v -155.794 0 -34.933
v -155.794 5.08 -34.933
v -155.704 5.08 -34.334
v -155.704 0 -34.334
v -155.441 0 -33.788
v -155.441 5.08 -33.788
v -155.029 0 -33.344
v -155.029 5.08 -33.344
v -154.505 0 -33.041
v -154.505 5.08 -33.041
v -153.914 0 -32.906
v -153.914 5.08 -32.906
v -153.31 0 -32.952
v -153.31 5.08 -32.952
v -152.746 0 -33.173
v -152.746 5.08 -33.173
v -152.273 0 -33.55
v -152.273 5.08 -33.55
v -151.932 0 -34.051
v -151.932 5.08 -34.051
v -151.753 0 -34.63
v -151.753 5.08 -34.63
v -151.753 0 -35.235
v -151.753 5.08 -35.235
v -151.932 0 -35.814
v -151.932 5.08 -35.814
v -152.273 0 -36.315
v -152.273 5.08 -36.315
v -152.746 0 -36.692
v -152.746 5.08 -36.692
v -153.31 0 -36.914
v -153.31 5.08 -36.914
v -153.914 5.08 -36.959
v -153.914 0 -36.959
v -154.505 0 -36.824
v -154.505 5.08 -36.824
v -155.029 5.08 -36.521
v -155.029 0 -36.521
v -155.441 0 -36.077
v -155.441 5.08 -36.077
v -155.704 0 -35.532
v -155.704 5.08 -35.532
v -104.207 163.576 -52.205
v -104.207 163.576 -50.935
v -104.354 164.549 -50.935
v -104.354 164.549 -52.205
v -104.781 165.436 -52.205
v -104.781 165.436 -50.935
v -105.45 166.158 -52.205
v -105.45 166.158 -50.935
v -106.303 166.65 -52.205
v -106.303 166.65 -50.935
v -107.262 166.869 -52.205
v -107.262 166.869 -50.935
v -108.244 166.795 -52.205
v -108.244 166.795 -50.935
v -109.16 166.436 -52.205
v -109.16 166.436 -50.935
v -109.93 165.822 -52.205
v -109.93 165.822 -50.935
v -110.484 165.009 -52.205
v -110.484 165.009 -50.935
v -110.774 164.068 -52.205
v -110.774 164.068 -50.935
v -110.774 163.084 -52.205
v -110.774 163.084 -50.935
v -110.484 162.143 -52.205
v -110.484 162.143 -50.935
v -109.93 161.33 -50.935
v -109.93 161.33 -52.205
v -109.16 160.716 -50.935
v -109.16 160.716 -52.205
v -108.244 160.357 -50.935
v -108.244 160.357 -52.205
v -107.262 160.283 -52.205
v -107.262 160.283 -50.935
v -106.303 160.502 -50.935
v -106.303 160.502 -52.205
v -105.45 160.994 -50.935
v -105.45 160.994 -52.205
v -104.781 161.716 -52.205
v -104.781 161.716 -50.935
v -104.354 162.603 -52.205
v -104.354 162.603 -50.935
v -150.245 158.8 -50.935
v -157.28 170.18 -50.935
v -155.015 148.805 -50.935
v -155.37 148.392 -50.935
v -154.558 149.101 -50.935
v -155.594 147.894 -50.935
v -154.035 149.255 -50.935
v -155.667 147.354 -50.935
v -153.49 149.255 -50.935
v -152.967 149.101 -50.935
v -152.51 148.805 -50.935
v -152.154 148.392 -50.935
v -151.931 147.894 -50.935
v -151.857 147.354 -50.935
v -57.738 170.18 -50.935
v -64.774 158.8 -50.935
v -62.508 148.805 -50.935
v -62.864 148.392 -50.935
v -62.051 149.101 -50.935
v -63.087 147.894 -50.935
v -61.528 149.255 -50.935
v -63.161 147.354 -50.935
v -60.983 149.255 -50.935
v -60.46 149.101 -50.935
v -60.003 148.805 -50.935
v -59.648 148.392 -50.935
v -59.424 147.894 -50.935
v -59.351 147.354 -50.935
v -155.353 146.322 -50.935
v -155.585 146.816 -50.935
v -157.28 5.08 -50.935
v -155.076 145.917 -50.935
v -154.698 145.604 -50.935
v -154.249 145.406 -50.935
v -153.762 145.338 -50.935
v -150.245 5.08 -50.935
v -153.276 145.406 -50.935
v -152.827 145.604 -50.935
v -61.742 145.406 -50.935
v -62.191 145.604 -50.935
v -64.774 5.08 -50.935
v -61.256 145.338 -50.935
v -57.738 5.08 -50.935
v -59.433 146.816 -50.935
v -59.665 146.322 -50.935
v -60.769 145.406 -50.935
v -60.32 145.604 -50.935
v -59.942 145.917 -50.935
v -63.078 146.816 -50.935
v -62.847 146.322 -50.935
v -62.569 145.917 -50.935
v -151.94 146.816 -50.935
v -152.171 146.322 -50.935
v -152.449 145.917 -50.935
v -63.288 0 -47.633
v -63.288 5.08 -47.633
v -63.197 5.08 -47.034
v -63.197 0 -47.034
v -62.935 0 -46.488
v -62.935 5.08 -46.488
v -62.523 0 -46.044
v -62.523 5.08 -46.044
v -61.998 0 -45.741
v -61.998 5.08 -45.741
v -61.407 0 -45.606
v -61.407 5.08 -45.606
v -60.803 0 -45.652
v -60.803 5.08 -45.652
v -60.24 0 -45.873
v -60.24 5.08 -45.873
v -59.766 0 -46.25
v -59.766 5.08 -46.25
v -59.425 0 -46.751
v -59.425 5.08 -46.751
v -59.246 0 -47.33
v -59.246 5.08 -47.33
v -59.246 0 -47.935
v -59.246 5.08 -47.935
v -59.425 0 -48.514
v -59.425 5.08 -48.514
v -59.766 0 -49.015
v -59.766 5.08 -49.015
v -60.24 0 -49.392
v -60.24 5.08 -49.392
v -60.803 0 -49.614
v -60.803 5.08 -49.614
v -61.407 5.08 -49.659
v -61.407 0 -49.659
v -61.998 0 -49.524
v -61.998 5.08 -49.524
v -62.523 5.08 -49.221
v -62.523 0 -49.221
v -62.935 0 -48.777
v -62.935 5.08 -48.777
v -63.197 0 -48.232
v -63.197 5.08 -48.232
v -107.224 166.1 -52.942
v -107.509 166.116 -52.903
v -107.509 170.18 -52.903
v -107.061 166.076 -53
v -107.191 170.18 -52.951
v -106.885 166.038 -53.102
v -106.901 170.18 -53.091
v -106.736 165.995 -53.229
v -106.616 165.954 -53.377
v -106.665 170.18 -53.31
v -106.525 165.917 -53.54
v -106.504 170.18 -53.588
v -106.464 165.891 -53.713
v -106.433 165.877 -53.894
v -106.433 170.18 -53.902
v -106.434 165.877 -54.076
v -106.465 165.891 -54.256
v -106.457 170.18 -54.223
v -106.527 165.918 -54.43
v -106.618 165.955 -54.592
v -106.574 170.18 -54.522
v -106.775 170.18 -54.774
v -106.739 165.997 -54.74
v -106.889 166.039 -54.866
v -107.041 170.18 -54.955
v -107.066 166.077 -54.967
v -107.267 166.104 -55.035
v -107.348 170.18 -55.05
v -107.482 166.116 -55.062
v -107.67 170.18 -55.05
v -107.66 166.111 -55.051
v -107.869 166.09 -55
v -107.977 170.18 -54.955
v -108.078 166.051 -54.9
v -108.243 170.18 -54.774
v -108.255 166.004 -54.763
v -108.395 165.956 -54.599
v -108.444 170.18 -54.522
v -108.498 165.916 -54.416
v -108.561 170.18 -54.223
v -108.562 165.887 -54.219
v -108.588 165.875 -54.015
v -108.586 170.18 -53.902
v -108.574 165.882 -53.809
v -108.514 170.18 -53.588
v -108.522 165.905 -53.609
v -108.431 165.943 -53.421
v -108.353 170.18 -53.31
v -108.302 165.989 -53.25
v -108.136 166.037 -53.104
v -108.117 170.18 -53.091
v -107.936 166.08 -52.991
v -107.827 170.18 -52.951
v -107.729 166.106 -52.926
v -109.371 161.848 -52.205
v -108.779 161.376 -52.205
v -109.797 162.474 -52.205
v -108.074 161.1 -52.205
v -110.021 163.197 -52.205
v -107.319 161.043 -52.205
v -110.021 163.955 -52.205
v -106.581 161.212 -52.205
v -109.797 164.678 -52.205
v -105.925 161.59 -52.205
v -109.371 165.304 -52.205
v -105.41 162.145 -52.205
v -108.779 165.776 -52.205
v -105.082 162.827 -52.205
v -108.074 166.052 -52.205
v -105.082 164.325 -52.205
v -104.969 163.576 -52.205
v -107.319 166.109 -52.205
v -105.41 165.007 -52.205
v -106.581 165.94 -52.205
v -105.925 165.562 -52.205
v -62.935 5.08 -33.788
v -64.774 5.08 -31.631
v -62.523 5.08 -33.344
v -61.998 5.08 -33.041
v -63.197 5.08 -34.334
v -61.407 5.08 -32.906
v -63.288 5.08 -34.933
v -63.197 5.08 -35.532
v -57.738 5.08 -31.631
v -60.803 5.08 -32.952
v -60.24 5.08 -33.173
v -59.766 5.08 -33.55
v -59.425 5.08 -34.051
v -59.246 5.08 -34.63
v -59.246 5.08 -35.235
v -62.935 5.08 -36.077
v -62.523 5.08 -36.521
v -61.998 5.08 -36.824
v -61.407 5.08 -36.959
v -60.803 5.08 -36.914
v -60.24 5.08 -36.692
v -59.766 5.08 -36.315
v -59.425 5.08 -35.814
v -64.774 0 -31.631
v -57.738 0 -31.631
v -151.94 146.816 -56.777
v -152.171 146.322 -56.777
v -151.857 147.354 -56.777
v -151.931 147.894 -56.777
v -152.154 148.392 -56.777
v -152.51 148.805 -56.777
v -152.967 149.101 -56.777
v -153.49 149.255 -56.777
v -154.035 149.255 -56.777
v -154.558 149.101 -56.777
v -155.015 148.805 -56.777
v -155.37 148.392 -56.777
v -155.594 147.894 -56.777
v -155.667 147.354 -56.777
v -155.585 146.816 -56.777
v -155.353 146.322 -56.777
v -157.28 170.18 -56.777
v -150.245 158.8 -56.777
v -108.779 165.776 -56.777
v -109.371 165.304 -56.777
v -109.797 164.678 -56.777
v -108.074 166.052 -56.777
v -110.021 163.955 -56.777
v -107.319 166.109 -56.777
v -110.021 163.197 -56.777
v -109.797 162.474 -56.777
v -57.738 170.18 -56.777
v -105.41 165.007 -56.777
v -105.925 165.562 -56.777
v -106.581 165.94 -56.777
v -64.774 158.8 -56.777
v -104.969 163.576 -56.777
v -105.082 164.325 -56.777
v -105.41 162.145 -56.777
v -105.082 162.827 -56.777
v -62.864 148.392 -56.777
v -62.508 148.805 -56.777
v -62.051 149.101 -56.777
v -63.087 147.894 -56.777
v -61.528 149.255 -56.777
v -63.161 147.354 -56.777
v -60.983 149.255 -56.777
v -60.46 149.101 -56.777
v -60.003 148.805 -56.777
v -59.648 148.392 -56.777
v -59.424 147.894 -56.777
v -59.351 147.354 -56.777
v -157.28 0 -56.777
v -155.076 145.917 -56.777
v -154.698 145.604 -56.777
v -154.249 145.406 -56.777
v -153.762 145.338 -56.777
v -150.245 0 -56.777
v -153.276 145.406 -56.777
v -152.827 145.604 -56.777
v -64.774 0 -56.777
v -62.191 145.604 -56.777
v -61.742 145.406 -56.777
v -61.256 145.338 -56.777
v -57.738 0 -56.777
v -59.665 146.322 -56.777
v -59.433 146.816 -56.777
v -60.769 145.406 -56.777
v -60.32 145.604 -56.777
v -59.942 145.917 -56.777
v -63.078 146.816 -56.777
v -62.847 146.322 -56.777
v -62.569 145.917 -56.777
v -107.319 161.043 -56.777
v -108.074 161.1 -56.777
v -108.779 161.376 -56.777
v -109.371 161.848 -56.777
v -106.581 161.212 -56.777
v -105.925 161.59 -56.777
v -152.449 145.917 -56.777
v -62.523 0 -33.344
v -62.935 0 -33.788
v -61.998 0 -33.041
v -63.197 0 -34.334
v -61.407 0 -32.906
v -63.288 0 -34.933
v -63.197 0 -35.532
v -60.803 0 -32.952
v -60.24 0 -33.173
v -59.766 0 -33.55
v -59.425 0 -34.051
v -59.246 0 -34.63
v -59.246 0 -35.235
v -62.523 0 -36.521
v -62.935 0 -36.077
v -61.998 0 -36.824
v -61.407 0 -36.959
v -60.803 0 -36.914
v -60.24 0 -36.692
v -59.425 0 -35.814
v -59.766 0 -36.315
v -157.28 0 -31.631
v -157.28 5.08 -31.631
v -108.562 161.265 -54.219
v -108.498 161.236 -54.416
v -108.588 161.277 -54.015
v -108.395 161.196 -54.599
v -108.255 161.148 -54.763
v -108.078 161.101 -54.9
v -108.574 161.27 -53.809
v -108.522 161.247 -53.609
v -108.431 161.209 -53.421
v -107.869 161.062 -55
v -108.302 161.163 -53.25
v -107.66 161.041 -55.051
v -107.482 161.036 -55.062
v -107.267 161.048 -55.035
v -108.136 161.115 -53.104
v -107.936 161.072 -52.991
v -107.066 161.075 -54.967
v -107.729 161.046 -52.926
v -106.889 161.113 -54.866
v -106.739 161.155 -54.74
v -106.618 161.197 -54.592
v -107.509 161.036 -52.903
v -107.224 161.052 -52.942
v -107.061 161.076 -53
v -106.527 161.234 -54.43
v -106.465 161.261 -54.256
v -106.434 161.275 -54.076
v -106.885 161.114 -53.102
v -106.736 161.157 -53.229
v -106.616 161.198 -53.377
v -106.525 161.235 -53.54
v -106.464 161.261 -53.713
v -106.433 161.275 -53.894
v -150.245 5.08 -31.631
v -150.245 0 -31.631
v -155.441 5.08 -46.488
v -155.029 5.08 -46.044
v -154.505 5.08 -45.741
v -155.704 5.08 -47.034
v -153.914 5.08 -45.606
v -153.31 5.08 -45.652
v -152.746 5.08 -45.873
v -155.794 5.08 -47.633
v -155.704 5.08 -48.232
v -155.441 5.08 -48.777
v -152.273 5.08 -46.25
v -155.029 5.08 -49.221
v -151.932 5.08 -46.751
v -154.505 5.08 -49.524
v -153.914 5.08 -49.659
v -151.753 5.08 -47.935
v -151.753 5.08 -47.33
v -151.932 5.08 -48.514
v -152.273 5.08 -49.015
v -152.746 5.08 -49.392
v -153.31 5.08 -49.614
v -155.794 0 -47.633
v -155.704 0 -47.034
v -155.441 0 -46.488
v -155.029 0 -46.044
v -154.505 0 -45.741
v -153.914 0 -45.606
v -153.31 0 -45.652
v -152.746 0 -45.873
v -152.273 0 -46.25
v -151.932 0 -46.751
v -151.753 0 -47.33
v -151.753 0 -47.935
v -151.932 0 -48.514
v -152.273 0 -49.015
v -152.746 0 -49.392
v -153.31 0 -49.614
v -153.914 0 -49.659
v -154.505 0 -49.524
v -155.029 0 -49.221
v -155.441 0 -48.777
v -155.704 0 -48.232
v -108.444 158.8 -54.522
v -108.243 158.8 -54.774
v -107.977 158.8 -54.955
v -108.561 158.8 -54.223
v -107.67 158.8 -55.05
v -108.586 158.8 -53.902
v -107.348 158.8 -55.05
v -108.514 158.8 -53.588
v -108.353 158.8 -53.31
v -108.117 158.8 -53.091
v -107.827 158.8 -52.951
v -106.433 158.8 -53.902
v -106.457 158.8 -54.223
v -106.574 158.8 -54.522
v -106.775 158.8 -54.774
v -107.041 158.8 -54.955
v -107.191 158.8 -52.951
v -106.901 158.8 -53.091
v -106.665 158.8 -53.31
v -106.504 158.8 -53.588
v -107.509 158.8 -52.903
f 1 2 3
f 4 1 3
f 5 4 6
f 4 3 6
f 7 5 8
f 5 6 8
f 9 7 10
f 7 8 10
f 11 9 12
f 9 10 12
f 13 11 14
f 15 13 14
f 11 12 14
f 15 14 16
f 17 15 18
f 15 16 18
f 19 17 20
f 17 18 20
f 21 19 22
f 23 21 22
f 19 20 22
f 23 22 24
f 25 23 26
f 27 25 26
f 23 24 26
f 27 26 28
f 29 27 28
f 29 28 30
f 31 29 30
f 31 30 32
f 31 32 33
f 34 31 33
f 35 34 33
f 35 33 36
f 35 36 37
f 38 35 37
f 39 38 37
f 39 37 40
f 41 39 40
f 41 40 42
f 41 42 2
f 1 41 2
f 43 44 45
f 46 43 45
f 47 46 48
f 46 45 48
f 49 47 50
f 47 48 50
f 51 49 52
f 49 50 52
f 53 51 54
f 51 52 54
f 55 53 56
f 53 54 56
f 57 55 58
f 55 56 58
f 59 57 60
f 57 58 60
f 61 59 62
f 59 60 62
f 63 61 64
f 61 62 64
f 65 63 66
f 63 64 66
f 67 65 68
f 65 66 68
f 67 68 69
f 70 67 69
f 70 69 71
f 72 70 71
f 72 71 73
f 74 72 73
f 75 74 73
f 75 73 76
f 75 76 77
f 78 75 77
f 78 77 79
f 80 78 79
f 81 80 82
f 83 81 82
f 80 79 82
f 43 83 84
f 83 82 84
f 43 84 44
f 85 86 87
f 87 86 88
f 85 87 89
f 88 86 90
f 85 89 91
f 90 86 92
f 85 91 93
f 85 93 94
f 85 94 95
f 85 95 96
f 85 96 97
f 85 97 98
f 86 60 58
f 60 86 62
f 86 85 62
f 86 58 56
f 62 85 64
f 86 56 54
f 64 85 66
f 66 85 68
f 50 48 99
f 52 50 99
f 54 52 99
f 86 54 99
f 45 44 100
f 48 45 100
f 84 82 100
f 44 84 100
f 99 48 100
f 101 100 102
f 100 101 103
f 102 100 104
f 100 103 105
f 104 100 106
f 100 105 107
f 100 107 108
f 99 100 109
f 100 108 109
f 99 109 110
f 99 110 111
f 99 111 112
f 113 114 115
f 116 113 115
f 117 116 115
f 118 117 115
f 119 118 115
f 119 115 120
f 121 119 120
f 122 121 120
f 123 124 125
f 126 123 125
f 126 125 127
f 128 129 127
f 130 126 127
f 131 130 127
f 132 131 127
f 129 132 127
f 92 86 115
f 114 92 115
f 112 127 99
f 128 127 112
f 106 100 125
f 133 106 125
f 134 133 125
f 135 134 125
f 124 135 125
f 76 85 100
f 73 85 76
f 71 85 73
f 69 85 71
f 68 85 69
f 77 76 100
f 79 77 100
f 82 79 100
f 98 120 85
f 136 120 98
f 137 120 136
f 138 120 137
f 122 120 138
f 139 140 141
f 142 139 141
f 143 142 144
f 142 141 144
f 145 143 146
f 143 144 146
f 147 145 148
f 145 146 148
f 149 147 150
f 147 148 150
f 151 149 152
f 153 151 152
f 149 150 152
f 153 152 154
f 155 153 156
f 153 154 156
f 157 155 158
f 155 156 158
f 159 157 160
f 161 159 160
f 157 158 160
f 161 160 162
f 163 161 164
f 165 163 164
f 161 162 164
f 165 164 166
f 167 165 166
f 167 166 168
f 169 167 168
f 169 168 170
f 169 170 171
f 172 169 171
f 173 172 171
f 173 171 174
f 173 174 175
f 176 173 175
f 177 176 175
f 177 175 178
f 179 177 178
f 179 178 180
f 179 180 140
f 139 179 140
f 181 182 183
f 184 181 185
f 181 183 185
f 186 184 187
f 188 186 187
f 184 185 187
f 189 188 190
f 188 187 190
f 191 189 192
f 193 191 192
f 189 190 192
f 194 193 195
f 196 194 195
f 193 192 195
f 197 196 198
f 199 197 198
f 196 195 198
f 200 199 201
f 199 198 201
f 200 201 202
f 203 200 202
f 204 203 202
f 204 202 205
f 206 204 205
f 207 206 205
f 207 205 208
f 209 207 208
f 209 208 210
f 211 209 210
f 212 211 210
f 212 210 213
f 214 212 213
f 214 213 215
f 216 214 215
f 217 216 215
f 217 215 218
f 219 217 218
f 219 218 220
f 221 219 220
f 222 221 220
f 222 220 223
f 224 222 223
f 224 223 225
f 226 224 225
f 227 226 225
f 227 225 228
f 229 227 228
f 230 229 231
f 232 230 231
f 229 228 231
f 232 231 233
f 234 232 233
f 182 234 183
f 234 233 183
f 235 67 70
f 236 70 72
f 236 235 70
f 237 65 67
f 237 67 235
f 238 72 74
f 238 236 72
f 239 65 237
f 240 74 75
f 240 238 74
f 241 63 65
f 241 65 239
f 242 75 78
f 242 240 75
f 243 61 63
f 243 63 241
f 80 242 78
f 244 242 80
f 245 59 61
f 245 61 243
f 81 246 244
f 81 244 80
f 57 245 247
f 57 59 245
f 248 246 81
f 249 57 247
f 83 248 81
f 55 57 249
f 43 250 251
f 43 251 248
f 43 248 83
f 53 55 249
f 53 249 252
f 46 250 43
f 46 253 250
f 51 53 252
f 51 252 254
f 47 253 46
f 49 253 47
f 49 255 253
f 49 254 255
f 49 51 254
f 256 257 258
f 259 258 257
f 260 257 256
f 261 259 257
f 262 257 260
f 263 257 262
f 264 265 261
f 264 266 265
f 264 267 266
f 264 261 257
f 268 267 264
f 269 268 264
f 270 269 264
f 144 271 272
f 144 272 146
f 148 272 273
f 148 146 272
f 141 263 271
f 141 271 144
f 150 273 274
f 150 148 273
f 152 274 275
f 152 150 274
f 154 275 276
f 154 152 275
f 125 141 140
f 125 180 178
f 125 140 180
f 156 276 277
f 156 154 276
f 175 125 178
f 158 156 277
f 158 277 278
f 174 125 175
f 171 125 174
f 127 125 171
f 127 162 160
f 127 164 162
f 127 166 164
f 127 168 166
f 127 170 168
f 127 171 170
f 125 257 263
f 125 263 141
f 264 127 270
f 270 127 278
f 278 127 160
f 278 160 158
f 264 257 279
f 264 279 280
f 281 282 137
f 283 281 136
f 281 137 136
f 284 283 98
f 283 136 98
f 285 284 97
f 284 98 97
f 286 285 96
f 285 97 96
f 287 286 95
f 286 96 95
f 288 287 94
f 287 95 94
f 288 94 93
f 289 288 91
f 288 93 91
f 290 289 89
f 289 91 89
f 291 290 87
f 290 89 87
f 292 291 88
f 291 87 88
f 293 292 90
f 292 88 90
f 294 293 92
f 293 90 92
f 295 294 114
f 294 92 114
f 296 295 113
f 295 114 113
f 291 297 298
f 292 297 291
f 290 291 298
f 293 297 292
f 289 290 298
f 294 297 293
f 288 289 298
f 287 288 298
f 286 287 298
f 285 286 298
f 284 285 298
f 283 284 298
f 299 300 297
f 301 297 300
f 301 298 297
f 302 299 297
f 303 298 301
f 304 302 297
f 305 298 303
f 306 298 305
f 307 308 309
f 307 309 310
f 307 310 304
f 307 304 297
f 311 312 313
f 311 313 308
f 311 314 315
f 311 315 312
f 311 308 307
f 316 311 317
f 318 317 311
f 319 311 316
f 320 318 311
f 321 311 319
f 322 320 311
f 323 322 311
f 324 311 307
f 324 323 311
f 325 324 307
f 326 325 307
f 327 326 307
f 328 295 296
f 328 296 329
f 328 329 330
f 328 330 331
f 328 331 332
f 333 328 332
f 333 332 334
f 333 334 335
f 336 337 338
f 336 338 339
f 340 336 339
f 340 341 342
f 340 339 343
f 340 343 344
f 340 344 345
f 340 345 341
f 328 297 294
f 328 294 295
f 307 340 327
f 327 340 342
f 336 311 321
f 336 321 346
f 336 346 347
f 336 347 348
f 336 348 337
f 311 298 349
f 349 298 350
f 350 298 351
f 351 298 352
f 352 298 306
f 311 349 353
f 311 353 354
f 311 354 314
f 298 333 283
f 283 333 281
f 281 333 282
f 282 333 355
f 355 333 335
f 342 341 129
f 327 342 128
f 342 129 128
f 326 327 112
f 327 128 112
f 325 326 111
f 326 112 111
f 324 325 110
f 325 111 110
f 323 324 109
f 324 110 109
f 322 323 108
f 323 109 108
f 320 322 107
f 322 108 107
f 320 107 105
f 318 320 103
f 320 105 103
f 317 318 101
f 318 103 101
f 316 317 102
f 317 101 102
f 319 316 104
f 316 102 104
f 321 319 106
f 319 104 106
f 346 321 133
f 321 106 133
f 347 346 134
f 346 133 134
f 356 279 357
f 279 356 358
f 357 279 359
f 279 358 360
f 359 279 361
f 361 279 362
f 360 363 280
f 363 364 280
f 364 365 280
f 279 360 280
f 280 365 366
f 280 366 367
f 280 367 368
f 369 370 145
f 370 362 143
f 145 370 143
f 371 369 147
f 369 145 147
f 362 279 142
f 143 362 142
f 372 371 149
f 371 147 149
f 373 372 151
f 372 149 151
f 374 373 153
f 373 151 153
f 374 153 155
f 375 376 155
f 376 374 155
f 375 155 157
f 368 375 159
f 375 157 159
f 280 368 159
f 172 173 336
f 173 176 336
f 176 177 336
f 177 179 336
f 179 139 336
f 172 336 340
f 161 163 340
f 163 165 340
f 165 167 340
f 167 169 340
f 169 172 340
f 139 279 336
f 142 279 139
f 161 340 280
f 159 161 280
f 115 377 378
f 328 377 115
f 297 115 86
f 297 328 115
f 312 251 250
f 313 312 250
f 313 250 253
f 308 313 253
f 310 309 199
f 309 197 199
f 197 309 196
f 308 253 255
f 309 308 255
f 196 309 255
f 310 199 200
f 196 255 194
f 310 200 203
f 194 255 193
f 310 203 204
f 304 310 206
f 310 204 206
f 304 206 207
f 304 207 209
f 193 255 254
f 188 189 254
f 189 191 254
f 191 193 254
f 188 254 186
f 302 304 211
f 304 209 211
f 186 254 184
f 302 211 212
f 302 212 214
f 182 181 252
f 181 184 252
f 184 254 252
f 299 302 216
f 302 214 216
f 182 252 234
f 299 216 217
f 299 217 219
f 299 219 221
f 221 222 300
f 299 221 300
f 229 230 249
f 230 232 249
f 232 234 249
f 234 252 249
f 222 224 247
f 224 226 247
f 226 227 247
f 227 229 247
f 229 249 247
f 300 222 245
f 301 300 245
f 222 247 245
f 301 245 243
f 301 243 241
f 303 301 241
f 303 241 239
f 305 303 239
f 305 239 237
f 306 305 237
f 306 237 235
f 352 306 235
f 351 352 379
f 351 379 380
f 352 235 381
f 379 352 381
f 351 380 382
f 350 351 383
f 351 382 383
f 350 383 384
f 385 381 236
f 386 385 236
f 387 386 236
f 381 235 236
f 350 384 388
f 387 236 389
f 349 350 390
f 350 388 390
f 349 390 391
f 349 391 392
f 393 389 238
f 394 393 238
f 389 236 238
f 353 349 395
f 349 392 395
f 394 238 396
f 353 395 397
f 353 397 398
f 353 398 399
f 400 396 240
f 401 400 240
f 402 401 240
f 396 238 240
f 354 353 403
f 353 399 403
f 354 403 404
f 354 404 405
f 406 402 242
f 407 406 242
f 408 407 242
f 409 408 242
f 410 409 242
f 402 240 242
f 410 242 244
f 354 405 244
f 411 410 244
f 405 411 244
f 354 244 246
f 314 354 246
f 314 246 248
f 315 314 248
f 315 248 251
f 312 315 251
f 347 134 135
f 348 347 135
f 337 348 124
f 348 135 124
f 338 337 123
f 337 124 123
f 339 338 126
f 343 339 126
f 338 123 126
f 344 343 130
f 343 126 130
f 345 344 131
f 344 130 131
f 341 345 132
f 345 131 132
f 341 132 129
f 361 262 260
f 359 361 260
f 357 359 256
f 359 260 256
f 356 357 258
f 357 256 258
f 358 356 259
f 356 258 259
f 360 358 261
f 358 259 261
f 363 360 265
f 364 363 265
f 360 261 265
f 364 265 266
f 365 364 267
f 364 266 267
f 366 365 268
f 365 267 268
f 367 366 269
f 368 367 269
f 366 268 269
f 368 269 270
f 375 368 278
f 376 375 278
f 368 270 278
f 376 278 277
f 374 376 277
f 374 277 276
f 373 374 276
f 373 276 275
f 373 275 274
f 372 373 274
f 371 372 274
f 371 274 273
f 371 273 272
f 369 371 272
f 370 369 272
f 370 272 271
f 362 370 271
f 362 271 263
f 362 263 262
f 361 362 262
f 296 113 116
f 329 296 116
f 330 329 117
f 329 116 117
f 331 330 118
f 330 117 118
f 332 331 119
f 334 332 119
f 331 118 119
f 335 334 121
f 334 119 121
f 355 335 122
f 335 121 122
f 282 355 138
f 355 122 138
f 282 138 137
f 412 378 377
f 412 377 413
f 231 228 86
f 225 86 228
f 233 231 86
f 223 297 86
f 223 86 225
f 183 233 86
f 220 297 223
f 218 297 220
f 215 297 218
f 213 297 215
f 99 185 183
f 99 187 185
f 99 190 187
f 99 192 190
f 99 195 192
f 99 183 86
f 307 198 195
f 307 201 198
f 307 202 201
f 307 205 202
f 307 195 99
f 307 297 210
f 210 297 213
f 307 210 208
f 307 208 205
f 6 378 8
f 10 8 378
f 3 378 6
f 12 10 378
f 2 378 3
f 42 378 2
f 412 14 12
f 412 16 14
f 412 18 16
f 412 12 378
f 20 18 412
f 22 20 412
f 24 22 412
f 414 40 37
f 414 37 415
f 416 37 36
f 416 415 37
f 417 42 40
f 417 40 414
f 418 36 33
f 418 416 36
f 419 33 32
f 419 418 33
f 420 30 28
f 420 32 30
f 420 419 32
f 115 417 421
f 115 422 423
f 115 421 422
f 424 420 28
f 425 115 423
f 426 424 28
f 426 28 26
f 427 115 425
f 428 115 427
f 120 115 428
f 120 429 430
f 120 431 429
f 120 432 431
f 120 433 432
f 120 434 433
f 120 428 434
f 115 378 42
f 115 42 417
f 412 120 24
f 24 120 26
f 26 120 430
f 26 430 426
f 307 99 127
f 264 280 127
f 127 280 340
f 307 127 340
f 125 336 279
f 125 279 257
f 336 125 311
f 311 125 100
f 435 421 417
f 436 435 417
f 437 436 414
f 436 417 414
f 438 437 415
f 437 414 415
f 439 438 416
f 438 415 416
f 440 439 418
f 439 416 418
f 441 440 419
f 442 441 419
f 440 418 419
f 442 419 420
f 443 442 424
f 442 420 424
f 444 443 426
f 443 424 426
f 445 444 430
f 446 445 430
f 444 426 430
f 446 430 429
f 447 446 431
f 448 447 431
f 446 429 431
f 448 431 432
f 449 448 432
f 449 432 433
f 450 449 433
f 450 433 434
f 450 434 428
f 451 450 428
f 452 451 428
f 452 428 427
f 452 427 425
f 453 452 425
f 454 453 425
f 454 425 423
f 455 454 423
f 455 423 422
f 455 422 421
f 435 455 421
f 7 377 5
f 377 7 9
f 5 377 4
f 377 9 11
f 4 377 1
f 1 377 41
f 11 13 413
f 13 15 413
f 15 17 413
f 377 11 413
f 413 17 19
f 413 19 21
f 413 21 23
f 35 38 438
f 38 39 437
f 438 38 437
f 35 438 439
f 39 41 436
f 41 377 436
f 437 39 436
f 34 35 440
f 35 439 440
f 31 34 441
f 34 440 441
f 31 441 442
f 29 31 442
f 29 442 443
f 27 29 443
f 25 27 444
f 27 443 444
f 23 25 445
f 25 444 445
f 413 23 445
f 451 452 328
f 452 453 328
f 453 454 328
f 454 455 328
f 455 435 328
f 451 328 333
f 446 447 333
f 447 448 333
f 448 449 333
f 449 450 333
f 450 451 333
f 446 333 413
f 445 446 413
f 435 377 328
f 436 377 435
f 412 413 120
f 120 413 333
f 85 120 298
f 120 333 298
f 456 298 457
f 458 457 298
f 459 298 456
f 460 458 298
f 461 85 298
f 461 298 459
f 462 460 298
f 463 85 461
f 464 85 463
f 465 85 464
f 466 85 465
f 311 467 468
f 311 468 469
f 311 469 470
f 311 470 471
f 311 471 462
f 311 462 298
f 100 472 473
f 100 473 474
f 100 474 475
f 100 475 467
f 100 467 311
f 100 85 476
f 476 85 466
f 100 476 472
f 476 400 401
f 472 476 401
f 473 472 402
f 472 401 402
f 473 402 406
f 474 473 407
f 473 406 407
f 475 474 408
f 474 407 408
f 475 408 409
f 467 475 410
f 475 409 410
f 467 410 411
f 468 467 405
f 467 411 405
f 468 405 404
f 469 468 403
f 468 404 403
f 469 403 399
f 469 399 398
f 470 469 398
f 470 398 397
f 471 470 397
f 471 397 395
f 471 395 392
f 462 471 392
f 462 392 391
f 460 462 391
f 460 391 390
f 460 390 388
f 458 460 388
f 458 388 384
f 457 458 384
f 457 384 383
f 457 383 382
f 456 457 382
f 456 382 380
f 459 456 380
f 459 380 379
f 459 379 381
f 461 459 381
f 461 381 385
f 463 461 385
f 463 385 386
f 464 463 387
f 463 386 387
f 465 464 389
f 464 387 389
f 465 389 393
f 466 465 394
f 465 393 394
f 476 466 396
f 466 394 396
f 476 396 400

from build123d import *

# Parameters (mm, degrees)
SKETCH1_W           = 99.5426
SKETCH1_H           = 5.842
BOSS_EXTRUDE1_DEPTH = 170.18
SKETCH2_W           = 85.471
SKETCH2_H           = 158.8
CUT_EXTRUDE1_DEPTH  = 232.802638094
SKETCH3_W           = 7.0358
SKETCH3_H           = 5.08
BOSS_EXTRUDE2_DEPTH = 19.304
SKETCH4_R           = 2.032
CUT_EXTRUDE2_DEPTH  = 235.986581553
SKETCH5_R           = 2.54
CUT_EXTRUDE3_DEPTH  = 233.531671991
SKETCH7_R           = 3.302
CUT_EXTRUDE4_DEPTH  = 1.27
SKETCH10_R          = 1.0795
CUT_EXTRUDE7_DEPTH  = 239.583142552
SKETCH11_R          = 1.778
CUT_EXTRUDE8_DEPTH  = 233.531672065
SKETCH9_R           = 1.905
CUT_EXTRUDE6_DEPTH  = 233.531672065


with BuildPart() as part:
    # Sketch1 → Boss-Extrude1 (new body)
    with BuildSketch(Plane(origin=(0, 0, 0), x_dir=(1, 0, 0), z_dir=(0, 1, 0))):
        with Locations((-107.509028278, 53.855595943)):
            Rectangle(SKETCH1_W, SKETCH1_H)
    extrude(amount=BOSS_EXTRUDE1_DEPTH)

    # Sketch2 → Cut-Extrude1 (cut, through all)
    with BuildSketch(Plane.XY.offset(-50.934595943)):
        with Locations((-107.509028278, 79.4)):
            Rectangle(SKETCH2_W, SKETCH2_H)
    extrude(amount=-CUT_EXTRUDE1_DEPTH, mode=Mode.SUBTRACT)

    # Sketch3 → Boss-Extrude2 (add)
    with BuildSketch(Plane.XY.offset(-50.934595943)):
        with Locations((-153.762428278, 2.54)):
            Rectangle(SKETCH3_W, SKETCH3_H)
        with Locations((-61.255628278, 2.54)):
            Rectangle(SKETCH3_W, SKETCH3_H)
    extrude(amount=BOSS_EXTRUDE2_DEPTH)

    # Sketch4 → Cut-Extrude2 (cut, through all)
    with BuildSketch(Plane(origin=(0, 5.08, 0), x_dir=(1, 0, 0), z_dir=(0, 1, 0))):
        with Locations(Location((-153.762428278, 34.932595943, 0), (0, 0, 180))):
            Circle(SKETCH4_R)
        with Locations(Location((-153.762428278, 47.632595943, 0), (0, 0, 180))):
            Circle(SKETCH4_R)
        with Locations(Location((-61.255628278, 34.932595943, 0), (0, 0, 180))):
            Circle(SKETCH4_R)
        with Locations(Location((-61.255628278, 47.632595943, 0), (0, 0, 180))):
            Circle(SKETCH4_R)
    extrude(amount=-CUT_EXTRUDE2_DEPTH, mode=Mode.SUBTRACT)

    # Sketch5 → Cut-Extrude3 (cut, through all)
    with BuildSketch(Plane.XY.offset(-50.934595943)):
        with Locations((-107.509028278, 163.576)):
            Circle(SKETCH5_R)
    extrude(amount=-CUT_EXTRUDE3_DEPTH, mode=Mode.SUBTRACT)

    # Sketch7 → Cut-Extrude4 (cut)
    with BuildSketch(Plane.XY.offset(-50.934595943)):
        with Locations((-107.509028278, 163.576)):
            Circle(SKETCH7_R)
    extrude(amount=-CUT_EXTRUDE4_DEPTH, mode=Mode.SUBTRACT)

    # Sketch10 → Cut-Extrude7 (cut, through all)
    with BuildSketch(Plane(origin=(0, 170.18, 0), x_dir=(1, 0, 0), z_dir=(0, 1, 0))):
        with Locations(Location((-107.509028278, 53.982595943, 0), (0, 0, 270))):
            Circle(SKETCH10_R)
    extrude(amount=-CUT_EXTRUDE7_DEPTH, mode=Mode.SUBTRACT)

    # Sketch11 → Cut-Extrude8 (cut, through all)
    with BuildSketch(Plane.XY.offset(-50.934595943)):
        with Locations((-153.762428278, 147.116)):
            Circle(SKETCH11_R)
        with Locations((-61.255628278, 147.116)):
            Circle(SKETCH11_R)
    extrude(amount=-CUT_EXTRUDE8_DEPTH, mode=Mode.SUBTRACT)

    # Sketch9 → Cut-Extrude6 (cut, through all)
    with BuildSketch(Plane.XY.offset(-50.934595943)):
        with Locations((-153.762428278, 147.37)):
            Circle(SKETCH9_R)
        with Locations((-61.255628278, 147.37)):
            Circle(SKETCH9_R)
    extrude(amount=-CUT_EXTRUDE6_DEPTH, mode=Mode.SUBTRACT)


solid = part.part
